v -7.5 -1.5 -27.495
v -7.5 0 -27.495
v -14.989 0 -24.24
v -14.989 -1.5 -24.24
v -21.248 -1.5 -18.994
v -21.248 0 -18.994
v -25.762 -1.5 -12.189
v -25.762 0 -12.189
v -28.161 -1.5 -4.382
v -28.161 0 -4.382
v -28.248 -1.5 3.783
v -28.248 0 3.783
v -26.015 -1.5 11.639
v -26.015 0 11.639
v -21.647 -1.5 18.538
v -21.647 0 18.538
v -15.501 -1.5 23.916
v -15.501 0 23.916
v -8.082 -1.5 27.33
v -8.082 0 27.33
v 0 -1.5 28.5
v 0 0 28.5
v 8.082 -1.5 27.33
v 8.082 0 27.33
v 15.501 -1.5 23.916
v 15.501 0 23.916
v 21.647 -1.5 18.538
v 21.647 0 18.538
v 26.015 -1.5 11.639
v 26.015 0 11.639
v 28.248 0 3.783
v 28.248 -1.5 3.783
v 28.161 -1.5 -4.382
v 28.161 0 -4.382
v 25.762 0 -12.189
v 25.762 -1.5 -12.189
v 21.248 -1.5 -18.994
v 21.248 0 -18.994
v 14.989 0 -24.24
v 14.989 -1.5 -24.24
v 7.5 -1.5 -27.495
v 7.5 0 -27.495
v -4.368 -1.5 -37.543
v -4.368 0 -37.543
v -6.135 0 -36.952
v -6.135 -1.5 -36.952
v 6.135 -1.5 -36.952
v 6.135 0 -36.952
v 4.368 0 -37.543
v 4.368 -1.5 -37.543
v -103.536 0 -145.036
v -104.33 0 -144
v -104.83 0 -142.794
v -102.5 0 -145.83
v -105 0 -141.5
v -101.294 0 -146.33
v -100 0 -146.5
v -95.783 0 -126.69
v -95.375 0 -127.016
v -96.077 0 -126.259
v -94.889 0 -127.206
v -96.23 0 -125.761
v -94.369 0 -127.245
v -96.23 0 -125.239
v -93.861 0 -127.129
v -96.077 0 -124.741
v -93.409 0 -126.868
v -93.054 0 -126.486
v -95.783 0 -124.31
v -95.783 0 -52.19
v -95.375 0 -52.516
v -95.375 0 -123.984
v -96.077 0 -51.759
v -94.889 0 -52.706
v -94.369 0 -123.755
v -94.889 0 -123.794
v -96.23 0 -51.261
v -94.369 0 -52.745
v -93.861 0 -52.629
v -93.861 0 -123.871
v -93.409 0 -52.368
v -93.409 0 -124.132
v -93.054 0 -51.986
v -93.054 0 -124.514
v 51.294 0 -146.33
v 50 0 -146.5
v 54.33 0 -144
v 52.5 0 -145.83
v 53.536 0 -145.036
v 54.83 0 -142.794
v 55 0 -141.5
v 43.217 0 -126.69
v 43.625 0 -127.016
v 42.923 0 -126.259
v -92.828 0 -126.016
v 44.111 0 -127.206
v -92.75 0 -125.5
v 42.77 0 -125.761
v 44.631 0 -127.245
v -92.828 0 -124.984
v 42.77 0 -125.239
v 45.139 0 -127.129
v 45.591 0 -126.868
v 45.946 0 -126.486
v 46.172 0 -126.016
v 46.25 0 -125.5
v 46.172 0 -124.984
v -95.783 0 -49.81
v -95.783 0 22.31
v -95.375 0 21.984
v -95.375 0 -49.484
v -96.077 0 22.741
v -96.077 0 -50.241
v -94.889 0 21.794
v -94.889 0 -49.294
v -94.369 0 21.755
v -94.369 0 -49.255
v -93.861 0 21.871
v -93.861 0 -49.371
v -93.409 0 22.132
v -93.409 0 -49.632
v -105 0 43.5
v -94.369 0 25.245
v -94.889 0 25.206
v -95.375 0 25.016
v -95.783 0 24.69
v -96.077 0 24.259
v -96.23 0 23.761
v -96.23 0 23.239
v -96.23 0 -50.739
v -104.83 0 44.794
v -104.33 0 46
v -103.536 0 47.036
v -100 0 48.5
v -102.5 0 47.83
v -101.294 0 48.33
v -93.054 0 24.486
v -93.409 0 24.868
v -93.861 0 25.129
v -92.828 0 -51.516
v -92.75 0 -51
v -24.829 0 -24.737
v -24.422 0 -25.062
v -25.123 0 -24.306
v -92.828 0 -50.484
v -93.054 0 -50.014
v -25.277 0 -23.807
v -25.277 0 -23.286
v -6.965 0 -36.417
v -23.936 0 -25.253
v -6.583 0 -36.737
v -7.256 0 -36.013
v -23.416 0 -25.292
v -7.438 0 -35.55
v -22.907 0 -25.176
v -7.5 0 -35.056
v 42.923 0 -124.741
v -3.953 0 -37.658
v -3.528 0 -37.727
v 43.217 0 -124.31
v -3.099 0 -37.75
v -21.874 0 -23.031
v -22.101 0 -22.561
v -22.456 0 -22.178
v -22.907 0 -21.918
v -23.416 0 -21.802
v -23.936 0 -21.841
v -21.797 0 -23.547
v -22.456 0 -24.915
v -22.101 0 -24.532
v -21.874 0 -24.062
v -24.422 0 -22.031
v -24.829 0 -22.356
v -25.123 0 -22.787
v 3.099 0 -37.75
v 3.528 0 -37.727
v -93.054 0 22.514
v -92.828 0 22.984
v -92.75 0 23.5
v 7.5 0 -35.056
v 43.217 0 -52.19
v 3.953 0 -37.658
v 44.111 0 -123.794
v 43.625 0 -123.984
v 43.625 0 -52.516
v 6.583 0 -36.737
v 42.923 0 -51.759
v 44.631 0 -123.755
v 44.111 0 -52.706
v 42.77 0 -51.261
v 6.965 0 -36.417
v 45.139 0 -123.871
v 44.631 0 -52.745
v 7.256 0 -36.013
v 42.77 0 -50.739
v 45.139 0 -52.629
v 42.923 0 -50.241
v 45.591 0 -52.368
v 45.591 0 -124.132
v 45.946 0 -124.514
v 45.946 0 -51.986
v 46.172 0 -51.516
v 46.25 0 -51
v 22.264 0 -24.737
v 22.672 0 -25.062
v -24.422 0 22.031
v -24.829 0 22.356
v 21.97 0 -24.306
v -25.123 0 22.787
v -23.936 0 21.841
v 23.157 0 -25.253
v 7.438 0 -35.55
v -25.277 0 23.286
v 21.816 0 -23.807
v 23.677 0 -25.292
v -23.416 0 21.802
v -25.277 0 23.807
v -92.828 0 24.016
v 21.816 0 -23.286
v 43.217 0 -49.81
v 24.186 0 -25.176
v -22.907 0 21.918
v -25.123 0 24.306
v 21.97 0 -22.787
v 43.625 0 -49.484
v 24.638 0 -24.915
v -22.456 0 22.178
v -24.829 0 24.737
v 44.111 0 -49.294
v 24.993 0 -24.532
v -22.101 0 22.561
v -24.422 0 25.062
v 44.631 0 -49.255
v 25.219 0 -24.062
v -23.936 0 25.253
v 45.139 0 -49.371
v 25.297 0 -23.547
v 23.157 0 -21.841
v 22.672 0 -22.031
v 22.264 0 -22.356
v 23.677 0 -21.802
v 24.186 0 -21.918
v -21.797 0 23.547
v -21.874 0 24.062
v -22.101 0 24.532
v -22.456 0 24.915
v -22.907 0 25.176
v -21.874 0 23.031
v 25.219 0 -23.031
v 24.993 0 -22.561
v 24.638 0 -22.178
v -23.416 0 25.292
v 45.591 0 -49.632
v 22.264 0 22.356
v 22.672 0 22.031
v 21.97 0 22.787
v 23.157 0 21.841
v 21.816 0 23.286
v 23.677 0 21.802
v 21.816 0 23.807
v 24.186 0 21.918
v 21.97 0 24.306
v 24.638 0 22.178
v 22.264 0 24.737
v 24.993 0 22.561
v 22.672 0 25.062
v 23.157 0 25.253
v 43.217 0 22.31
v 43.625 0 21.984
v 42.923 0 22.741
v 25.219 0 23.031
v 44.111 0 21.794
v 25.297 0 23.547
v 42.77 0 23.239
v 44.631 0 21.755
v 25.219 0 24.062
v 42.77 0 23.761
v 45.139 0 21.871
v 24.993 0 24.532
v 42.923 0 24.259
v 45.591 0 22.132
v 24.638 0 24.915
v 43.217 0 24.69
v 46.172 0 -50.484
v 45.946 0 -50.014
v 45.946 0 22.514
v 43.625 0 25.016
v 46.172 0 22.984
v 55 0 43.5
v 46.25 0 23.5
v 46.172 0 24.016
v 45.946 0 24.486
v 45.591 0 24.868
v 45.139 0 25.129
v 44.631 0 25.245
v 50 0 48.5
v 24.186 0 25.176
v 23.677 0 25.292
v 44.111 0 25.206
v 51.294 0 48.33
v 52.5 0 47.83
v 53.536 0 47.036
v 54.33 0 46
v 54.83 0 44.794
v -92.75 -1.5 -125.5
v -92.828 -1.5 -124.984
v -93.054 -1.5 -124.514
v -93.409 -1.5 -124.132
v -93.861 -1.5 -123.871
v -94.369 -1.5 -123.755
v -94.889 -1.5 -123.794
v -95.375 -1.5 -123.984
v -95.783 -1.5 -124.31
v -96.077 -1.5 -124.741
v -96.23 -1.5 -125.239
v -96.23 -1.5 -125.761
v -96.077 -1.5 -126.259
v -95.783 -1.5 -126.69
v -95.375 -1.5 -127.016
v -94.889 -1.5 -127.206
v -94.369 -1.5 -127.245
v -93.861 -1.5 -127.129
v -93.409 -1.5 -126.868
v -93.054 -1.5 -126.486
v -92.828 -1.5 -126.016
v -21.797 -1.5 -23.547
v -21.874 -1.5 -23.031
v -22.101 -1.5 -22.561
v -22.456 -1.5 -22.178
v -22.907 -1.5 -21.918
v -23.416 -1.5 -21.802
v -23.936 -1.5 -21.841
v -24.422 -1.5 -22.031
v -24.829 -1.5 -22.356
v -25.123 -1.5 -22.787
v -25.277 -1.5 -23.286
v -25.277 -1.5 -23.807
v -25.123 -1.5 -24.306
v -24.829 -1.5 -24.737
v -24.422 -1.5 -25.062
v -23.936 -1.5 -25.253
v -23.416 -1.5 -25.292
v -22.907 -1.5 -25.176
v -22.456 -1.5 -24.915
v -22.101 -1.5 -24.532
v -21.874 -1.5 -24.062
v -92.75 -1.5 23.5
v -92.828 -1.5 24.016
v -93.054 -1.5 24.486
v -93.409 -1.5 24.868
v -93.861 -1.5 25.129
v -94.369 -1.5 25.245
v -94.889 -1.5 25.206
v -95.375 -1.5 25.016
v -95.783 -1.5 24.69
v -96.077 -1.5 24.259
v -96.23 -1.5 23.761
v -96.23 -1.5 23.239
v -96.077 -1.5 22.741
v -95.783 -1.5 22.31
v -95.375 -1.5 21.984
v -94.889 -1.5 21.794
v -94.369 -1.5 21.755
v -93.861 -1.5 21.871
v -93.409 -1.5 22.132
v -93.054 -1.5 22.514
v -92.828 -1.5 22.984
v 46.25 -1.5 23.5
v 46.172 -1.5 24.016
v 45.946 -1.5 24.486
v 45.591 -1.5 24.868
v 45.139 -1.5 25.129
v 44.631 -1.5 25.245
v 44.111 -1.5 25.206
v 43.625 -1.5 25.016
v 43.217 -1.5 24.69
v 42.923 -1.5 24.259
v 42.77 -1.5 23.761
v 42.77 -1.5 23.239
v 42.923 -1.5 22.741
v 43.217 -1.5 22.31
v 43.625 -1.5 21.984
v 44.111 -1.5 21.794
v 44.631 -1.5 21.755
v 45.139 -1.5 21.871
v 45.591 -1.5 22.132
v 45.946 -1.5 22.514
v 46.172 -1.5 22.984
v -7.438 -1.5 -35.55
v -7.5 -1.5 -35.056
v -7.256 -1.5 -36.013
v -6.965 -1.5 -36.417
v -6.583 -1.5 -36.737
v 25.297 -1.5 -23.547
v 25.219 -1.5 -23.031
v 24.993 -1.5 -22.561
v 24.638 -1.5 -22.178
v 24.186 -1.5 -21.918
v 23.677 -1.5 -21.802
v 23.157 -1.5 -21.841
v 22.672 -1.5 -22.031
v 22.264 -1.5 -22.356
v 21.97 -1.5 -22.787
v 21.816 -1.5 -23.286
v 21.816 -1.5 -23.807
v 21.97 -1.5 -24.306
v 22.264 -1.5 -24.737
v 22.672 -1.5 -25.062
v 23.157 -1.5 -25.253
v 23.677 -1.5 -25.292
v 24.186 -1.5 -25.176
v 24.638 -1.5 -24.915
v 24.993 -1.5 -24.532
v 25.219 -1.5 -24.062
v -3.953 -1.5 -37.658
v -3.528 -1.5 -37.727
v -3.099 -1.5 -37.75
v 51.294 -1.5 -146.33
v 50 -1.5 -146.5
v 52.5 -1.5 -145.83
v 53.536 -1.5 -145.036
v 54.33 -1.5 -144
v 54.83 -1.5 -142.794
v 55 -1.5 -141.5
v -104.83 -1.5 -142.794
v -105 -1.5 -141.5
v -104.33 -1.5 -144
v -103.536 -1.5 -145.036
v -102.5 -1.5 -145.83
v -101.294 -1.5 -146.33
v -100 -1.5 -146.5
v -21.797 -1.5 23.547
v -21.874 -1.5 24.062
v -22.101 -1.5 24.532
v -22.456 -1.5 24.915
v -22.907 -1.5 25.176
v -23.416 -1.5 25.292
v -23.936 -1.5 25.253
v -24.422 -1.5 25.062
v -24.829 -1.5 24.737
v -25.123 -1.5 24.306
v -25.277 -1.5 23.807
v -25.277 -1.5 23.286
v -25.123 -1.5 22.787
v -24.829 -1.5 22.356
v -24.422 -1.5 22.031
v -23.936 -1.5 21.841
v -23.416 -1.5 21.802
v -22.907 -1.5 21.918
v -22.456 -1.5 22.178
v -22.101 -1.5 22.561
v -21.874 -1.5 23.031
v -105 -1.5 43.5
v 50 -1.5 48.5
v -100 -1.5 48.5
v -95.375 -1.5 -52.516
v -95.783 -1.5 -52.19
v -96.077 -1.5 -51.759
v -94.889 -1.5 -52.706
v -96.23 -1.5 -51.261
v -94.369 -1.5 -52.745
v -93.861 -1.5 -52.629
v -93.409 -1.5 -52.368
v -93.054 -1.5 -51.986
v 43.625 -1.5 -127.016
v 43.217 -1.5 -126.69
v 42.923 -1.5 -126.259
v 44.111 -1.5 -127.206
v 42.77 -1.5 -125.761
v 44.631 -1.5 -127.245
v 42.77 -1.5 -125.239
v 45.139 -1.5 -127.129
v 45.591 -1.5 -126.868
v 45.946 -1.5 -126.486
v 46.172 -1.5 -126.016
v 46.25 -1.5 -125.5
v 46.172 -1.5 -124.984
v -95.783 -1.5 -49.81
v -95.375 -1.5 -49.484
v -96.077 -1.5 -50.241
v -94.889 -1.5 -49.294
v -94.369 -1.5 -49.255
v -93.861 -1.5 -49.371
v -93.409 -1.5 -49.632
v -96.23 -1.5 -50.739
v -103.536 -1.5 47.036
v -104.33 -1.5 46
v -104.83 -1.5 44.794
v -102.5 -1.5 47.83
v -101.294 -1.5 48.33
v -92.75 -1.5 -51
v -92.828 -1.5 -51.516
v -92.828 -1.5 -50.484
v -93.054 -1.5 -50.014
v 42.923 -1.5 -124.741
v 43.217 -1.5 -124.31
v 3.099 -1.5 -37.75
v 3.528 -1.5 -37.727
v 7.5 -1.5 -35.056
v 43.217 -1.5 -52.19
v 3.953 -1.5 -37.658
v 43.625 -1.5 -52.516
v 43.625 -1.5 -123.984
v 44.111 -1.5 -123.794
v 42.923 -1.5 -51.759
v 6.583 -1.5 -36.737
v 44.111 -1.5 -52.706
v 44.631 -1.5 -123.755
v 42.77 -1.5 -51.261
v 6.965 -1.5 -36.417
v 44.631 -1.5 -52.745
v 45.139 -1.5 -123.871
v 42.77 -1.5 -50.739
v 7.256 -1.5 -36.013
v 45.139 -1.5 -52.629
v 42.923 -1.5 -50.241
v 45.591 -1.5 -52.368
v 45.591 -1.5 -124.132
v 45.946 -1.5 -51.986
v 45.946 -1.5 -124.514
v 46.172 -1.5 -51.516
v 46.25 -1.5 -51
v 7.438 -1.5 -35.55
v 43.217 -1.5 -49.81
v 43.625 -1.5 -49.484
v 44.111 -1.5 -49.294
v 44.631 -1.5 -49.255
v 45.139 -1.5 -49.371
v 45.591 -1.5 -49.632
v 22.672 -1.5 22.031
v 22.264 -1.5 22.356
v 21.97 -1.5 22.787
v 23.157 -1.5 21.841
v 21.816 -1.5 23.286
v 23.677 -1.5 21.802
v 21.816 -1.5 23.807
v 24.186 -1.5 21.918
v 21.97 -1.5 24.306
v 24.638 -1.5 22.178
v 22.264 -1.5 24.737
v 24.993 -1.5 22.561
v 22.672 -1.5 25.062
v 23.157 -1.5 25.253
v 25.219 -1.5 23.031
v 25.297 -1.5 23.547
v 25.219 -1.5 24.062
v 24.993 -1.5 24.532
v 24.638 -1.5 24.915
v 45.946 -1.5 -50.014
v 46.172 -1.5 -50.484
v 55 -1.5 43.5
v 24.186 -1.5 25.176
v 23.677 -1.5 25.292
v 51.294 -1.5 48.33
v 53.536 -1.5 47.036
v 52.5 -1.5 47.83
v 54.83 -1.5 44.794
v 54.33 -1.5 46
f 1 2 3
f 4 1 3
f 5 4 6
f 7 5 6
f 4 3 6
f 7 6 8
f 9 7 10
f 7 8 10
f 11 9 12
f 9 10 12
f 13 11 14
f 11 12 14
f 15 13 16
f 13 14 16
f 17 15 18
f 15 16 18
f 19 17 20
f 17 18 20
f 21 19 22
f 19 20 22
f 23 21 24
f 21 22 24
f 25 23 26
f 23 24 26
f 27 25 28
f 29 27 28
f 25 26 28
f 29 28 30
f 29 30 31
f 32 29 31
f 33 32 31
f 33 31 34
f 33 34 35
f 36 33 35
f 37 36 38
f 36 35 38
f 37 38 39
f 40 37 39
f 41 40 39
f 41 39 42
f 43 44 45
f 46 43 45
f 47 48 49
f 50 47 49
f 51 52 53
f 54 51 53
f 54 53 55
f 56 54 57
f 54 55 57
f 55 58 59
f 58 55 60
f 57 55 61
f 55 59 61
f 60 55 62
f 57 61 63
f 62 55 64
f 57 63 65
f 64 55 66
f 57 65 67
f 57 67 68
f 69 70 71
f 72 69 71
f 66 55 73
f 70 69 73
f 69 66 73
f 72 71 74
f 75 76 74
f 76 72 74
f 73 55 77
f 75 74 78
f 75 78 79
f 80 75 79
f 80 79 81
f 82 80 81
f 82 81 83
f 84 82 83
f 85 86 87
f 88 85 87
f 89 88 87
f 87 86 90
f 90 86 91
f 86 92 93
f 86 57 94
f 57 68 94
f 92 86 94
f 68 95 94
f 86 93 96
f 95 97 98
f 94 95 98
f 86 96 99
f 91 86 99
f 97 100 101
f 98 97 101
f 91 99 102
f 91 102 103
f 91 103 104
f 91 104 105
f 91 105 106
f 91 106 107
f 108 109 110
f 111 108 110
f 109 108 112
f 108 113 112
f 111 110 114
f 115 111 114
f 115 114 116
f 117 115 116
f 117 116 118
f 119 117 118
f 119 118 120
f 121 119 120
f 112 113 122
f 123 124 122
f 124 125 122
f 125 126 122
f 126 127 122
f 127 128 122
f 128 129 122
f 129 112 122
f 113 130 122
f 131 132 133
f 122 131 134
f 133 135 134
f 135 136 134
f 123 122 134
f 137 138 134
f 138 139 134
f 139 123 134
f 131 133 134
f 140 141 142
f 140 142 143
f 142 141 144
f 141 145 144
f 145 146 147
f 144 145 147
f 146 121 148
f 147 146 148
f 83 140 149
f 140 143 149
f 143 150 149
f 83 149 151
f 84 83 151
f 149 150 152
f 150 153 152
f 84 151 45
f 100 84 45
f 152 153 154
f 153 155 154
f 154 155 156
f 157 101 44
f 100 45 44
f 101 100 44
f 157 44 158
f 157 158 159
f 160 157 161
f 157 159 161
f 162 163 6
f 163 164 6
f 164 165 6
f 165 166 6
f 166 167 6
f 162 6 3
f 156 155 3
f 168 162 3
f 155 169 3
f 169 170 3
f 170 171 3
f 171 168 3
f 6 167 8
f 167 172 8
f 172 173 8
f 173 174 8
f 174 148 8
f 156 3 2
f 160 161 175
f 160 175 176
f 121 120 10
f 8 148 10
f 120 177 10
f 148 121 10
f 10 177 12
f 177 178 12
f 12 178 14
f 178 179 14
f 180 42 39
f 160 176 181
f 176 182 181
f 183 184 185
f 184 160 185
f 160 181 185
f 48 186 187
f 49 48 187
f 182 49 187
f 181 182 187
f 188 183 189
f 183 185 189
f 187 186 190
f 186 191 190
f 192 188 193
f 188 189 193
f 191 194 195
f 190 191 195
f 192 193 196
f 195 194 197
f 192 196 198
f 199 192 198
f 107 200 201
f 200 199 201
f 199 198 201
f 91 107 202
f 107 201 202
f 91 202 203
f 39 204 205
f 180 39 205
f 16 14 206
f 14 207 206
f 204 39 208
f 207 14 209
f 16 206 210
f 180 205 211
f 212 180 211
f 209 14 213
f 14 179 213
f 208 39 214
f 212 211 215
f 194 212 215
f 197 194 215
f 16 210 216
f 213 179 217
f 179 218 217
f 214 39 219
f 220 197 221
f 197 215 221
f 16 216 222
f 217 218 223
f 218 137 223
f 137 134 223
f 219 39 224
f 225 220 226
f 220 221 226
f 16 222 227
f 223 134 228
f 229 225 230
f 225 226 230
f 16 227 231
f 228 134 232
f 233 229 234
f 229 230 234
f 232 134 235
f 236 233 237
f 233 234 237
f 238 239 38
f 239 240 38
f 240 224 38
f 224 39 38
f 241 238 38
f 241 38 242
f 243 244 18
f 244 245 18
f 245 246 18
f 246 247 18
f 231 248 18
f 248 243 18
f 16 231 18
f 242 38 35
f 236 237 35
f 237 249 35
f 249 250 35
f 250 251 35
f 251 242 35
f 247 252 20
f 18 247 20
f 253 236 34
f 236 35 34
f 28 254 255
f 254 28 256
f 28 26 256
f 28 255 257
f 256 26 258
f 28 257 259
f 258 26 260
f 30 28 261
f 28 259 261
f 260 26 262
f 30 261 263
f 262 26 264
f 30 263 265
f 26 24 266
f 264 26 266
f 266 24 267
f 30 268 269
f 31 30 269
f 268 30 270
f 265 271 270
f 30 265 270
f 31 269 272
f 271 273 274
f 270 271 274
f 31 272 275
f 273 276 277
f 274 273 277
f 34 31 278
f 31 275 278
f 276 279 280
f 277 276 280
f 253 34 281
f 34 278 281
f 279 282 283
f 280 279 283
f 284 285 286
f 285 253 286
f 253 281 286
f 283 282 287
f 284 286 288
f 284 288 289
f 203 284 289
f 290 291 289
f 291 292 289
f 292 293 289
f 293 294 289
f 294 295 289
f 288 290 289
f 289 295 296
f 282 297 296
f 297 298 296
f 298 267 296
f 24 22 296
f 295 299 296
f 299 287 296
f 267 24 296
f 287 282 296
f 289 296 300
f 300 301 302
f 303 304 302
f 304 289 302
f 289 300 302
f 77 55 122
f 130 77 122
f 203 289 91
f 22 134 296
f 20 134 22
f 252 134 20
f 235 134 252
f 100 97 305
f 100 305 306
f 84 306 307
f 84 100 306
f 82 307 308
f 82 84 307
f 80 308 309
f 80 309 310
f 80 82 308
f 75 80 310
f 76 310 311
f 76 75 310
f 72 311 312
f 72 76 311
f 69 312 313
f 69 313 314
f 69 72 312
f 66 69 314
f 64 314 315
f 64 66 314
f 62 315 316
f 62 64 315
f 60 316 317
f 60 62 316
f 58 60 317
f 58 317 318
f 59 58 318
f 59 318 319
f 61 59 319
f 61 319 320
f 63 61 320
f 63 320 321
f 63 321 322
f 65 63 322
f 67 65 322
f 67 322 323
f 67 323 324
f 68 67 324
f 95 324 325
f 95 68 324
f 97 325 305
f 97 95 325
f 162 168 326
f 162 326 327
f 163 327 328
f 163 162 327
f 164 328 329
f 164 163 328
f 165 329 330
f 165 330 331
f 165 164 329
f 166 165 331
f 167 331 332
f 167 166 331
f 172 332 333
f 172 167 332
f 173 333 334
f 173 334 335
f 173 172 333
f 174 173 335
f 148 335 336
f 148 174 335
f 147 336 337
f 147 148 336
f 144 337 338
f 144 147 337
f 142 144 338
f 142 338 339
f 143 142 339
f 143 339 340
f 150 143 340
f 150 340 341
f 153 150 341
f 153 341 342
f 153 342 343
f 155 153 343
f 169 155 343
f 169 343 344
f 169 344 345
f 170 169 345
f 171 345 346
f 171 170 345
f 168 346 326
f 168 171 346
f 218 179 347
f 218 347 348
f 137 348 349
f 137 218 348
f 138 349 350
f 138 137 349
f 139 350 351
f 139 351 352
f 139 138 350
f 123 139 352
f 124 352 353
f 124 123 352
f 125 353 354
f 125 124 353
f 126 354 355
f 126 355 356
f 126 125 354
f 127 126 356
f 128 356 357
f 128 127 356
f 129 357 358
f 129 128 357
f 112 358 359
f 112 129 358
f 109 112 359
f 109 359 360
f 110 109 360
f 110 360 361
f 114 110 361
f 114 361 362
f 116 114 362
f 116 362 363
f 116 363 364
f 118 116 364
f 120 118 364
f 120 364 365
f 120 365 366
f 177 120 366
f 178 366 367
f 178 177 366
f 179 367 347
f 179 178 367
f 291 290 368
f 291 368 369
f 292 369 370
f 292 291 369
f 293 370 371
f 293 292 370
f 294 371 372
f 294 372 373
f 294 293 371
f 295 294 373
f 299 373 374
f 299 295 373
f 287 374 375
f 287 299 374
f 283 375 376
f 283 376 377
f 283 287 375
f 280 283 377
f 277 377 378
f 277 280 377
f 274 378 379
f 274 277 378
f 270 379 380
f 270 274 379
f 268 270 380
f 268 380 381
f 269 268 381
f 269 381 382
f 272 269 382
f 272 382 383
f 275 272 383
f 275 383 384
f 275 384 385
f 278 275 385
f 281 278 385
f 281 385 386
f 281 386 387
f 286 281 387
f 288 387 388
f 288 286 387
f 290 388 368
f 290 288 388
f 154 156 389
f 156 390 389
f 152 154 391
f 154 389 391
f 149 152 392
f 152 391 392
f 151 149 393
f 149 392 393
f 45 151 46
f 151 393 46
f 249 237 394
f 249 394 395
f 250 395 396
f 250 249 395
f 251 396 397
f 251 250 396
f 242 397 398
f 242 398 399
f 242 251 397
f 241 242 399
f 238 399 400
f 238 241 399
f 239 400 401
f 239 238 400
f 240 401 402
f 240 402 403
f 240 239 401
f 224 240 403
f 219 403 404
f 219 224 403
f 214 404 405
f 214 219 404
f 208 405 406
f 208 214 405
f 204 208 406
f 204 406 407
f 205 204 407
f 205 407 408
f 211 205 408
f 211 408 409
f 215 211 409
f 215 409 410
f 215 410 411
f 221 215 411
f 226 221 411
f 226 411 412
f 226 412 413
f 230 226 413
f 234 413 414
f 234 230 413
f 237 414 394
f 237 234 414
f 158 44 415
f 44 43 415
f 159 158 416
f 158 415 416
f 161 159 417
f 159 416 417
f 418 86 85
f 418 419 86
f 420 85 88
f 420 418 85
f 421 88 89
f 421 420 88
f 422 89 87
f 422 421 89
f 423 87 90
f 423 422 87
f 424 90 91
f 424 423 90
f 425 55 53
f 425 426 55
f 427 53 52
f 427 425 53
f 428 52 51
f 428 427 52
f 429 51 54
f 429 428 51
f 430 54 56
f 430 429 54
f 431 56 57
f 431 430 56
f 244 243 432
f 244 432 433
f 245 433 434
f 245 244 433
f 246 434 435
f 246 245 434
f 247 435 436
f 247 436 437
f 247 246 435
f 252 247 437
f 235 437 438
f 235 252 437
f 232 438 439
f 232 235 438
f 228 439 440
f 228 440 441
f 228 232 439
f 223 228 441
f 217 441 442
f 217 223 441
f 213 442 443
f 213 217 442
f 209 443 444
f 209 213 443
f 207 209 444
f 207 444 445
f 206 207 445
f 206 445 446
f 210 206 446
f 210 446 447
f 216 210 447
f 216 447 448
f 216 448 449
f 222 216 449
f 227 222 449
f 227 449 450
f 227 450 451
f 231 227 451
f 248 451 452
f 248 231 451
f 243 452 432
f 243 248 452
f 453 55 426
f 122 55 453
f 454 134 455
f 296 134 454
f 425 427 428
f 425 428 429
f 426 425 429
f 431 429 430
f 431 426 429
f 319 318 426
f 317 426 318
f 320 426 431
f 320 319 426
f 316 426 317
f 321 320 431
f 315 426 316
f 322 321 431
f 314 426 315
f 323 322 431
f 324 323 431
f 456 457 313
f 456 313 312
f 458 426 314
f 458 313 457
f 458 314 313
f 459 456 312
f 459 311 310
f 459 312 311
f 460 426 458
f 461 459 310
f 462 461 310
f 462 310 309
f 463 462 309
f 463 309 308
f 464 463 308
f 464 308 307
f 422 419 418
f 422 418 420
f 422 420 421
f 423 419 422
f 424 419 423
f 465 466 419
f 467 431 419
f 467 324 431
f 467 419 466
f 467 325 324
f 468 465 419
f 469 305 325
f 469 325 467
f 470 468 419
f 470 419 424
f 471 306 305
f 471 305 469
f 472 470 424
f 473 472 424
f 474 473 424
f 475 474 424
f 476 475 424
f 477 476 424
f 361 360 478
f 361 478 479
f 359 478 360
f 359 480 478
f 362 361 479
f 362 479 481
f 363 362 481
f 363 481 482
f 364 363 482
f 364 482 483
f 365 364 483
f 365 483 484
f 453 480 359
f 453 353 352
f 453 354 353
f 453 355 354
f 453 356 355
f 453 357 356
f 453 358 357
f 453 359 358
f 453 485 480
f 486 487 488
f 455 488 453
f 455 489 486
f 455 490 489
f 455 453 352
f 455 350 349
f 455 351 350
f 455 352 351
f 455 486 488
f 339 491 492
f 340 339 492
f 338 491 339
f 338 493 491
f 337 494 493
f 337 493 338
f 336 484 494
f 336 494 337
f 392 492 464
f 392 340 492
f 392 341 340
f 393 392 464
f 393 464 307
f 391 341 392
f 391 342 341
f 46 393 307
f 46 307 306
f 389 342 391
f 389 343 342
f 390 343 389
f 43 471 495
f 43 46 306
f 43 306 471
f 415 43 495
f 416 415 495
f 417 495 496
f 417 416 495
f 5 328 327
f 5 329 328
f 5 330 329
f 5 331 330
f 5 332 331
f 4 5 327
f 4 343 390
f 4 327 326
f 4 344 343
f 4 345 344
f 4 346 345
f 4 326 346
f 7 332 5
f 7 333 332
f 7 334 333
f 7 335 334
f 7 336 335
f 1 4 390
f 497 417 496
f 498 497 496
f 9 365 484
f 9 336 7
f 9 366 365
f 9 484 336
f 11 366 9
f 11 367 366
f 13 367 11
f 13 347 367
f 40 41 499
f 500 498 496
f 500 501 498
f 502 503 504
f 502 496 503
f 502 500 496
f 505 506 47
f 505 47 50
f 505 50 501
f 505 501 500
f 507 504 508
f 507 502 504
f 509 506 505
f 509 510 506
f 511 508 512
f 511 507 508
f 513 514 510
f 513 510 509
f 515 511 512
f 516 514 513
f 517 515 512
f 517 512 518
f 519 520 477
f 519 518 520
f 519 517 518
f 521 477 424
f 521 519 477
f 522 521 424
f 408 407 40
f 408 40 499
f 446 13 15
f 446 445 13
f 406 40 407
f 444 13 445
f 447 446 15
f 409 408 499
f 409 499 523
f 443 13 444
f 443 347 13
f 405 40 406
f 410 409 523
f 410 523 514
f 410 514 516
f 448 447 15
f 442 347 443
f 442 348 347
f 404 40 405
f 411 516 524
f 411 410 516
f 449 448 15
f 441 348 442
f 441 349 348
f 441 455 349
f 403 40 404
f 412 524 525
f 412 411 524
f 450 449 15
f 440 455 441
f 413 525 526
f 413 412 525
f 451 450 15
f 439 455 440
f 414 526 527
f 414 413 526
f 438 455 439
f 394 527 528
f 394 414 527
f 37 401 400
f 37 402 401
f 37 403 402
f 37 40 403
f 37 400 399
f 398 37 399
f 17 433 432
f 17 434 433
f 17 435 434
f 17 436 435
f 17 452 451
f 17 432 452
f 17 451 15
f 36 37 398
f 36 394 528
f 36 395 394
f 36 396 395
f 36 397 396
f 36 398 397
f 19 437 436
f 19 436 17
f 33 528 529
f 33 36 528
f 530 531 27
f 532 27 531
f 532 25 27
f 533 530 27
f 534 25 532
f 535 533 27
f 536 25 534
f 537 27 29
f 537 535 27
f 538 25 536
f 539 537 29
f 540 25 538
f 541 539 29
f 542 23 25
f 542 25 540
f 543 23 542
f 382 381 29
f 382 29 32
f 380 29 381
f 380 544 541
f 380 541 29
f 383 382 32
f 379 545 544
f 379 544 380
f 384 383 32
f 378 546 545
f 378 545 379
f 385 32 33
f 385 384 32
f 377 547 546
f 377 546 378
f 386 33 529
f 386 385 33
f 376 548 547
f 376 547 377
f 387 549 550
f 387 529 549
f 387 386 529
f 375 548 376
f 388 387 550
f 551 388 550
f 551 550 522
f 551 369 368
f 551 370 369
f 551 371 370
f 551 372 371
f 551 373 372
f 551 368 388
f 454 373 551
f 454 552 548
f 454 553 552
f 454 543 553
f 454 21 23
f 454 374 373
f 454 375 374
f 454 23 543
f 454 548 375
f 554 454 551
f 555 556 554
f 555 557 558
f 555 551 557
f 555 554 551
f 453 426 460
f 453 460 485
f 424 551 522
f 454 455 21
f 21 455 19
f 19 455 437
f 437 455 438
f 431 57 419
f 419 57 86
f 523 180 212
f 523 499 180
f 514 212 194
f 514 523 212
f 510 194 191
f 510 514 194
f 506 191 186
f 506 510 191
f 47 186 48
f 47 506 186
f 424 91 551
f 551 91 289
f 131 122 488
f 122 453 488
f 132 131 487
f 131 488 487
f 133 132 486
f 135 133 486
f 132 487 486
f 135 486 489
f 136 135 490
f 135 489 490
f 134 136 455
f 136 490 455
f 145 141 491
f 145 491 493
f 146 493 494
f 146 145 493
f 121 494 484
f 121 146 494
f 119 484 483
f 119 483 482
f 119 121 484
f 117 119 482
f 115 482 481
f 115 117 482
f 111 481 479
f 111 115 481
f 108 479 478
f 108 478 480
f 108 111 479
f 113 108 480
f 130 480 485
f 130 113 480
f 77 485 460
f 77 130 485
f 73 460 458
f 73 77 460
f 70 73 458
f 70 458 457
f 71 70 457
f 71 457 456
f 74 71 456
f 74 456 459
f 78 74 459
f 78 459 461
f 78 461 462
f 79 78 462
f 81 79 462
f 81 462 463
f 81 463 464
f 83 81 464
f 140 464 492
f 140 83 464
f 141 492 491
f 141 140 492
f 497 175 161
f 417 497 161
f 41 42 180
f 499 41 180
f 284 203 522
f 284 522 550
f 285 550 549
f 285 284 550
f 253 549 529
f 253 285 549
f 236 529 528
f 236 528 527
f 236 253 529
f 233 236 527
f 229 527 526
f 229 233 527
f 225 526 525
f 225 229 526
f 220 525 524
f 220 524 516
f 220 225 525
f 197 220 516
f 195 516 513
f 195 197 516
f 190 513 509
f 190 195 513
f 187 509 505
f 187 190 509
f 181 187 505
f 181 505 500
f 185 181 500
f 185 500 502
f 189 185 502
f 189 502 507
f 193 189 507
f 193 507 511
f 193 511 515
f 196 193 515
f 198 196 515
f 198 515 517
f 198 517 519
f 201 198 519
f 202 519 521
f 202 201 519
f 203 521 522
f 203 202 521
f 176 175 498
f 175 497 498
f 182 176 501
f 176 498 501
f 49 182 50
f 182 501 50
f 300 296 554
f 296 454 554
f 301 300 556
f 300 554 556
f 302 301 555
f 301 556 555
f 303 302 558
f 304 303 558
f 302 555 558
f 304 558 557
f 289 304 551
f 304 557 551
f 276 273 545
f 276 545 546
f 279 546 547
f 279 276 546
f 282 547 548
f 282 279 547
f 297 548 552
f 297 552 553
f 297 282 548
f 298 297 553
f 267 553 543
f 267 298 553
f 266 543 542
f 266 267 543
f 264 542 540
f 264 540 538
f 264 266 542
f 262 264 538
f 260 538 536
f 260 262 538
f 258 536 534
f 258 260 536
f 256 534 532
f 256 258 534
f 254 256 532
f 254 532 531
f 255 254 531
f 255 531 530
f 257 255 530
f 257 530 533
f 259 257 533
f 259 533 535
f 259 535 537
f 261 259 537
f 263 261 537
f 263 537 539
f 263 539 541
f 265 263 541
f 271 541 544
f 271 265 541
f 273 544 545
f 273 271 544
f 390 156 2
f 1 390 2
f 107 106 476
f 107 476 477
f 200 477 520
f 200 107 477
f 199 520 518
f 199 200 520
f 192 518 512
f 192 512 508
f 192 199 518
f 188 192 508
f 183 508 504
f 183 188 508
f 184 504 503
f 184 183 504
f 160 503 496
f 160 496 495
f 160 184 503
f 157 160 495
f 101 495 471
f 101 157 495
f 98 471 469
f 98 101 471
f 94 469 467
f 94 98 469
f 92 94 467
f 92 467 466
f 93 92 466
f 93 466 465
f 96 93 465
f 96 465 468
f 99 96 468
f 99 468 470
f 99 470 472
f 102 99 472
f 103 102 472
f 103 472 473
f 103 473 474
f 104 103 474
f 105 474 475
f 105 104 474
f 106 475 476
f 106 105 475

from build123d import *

# Parameters (mm, degrees)
F0_W     = 160
F0_H     = 195
F0_R     = 1.75
F1_DEPTH = 1.5
F2_R     = 2
F3_R     = 4
F4_R     = 5


with BuildPart() as f1:
    # F0 (on Front) → F1 (new body)
    with BuildSketch(Plane.XZ):
        with Locations((-25, -49)):
            Rectangle(F0_W, F0_H)
        with Locations((-94.5, -125.5)):
            Circle(F0_R, mode=Mode.SUBTRACT)
        with Locations((-94.5, -51)):
            Circle(F0_R, mode=Mode.SUBTRACT)
        with Locations((44.5, -125.5)):
            Circle(F0_R, mode=Mode.SUBTRACT)
        with Locations((44.5, -51)):
            Circle(F0_R, mode=Mode.SUBTRACT)
        with Locations((-94.5, 23.5)):
            Circle(F0_R, mode=Mode.SUBTRACT)
        with Locations((-23.546656, -23.546656)):
            Circle(F0_R, mode=Mode.SUBTRACT)
        with BuildLine():
            ThreePointArc((-7.5, -27.495454), (0, 28.5), (7.5, -27.495454))
            Line((7.5, -27.495454), (7.5, -30))
            Line((7.5, -30), (7.5, -36.495454))
            Line((7.5, -36.495454), (3.75, -37.75))
            Line((3.75, -37.75), (0, -37.75))
            Line((0, -37.75), (-3.75, -37.75))
            Line((-3.75, -37.75), (-7.5, -36.495454))
            Line((-7.5, -36.495454), (-7.5, -30))
            Line((-7.5, -30), (-7.5, -27.495454))
        make_face(mode=Mode.SUBTRACT)
        with Locations((23.546656, -23.546656)):
            Circle(F0_R, mode=Mode.SUBTRACT)
        with Locations((-23.546656, 23.546656)):
            Circle(F0_R, mode=Mode.SUBTRACT)
        with Locations((23.546656, 23.546656)):
            Circle(F0_R, mode=Mode.SUBTRACT)
        with Locations((44.5, 23.5)):
            Circle(F0_R, mode=Mode.SUBTRACT)
    extrude(amount=F1_DEPTH)

    # F2
    f2_edges = [f1.edges().sort_by_distance(p)[0] for p in [
        (7.5, -0.75, -36.495454),
        (-7.5, -0.75, -36.495454),
    ]]
    fillet(f2_edges, radius=F2_R)

    # F3
    f3_edges = [f1.edges().sort_by_distance(p)[0] for p in [
        (3.75, -0.75, -37.75),
        (-3.75, -0.75, -37.75),
    ]]
    fillet(f3_edges, radius=F3_R)

    # F4
    f4_edges = [f1.edges().sort_by_distance(p)[0] for p in [
        (55, -0.75, 48.5),
        (-105, -0.75, 48.5),
        (-105, -0.75, -146.5),
        (55, -0.75, -146.5),
    ]]
    fillet(f4_edges, radius=F4_R)


solid = f1.part
